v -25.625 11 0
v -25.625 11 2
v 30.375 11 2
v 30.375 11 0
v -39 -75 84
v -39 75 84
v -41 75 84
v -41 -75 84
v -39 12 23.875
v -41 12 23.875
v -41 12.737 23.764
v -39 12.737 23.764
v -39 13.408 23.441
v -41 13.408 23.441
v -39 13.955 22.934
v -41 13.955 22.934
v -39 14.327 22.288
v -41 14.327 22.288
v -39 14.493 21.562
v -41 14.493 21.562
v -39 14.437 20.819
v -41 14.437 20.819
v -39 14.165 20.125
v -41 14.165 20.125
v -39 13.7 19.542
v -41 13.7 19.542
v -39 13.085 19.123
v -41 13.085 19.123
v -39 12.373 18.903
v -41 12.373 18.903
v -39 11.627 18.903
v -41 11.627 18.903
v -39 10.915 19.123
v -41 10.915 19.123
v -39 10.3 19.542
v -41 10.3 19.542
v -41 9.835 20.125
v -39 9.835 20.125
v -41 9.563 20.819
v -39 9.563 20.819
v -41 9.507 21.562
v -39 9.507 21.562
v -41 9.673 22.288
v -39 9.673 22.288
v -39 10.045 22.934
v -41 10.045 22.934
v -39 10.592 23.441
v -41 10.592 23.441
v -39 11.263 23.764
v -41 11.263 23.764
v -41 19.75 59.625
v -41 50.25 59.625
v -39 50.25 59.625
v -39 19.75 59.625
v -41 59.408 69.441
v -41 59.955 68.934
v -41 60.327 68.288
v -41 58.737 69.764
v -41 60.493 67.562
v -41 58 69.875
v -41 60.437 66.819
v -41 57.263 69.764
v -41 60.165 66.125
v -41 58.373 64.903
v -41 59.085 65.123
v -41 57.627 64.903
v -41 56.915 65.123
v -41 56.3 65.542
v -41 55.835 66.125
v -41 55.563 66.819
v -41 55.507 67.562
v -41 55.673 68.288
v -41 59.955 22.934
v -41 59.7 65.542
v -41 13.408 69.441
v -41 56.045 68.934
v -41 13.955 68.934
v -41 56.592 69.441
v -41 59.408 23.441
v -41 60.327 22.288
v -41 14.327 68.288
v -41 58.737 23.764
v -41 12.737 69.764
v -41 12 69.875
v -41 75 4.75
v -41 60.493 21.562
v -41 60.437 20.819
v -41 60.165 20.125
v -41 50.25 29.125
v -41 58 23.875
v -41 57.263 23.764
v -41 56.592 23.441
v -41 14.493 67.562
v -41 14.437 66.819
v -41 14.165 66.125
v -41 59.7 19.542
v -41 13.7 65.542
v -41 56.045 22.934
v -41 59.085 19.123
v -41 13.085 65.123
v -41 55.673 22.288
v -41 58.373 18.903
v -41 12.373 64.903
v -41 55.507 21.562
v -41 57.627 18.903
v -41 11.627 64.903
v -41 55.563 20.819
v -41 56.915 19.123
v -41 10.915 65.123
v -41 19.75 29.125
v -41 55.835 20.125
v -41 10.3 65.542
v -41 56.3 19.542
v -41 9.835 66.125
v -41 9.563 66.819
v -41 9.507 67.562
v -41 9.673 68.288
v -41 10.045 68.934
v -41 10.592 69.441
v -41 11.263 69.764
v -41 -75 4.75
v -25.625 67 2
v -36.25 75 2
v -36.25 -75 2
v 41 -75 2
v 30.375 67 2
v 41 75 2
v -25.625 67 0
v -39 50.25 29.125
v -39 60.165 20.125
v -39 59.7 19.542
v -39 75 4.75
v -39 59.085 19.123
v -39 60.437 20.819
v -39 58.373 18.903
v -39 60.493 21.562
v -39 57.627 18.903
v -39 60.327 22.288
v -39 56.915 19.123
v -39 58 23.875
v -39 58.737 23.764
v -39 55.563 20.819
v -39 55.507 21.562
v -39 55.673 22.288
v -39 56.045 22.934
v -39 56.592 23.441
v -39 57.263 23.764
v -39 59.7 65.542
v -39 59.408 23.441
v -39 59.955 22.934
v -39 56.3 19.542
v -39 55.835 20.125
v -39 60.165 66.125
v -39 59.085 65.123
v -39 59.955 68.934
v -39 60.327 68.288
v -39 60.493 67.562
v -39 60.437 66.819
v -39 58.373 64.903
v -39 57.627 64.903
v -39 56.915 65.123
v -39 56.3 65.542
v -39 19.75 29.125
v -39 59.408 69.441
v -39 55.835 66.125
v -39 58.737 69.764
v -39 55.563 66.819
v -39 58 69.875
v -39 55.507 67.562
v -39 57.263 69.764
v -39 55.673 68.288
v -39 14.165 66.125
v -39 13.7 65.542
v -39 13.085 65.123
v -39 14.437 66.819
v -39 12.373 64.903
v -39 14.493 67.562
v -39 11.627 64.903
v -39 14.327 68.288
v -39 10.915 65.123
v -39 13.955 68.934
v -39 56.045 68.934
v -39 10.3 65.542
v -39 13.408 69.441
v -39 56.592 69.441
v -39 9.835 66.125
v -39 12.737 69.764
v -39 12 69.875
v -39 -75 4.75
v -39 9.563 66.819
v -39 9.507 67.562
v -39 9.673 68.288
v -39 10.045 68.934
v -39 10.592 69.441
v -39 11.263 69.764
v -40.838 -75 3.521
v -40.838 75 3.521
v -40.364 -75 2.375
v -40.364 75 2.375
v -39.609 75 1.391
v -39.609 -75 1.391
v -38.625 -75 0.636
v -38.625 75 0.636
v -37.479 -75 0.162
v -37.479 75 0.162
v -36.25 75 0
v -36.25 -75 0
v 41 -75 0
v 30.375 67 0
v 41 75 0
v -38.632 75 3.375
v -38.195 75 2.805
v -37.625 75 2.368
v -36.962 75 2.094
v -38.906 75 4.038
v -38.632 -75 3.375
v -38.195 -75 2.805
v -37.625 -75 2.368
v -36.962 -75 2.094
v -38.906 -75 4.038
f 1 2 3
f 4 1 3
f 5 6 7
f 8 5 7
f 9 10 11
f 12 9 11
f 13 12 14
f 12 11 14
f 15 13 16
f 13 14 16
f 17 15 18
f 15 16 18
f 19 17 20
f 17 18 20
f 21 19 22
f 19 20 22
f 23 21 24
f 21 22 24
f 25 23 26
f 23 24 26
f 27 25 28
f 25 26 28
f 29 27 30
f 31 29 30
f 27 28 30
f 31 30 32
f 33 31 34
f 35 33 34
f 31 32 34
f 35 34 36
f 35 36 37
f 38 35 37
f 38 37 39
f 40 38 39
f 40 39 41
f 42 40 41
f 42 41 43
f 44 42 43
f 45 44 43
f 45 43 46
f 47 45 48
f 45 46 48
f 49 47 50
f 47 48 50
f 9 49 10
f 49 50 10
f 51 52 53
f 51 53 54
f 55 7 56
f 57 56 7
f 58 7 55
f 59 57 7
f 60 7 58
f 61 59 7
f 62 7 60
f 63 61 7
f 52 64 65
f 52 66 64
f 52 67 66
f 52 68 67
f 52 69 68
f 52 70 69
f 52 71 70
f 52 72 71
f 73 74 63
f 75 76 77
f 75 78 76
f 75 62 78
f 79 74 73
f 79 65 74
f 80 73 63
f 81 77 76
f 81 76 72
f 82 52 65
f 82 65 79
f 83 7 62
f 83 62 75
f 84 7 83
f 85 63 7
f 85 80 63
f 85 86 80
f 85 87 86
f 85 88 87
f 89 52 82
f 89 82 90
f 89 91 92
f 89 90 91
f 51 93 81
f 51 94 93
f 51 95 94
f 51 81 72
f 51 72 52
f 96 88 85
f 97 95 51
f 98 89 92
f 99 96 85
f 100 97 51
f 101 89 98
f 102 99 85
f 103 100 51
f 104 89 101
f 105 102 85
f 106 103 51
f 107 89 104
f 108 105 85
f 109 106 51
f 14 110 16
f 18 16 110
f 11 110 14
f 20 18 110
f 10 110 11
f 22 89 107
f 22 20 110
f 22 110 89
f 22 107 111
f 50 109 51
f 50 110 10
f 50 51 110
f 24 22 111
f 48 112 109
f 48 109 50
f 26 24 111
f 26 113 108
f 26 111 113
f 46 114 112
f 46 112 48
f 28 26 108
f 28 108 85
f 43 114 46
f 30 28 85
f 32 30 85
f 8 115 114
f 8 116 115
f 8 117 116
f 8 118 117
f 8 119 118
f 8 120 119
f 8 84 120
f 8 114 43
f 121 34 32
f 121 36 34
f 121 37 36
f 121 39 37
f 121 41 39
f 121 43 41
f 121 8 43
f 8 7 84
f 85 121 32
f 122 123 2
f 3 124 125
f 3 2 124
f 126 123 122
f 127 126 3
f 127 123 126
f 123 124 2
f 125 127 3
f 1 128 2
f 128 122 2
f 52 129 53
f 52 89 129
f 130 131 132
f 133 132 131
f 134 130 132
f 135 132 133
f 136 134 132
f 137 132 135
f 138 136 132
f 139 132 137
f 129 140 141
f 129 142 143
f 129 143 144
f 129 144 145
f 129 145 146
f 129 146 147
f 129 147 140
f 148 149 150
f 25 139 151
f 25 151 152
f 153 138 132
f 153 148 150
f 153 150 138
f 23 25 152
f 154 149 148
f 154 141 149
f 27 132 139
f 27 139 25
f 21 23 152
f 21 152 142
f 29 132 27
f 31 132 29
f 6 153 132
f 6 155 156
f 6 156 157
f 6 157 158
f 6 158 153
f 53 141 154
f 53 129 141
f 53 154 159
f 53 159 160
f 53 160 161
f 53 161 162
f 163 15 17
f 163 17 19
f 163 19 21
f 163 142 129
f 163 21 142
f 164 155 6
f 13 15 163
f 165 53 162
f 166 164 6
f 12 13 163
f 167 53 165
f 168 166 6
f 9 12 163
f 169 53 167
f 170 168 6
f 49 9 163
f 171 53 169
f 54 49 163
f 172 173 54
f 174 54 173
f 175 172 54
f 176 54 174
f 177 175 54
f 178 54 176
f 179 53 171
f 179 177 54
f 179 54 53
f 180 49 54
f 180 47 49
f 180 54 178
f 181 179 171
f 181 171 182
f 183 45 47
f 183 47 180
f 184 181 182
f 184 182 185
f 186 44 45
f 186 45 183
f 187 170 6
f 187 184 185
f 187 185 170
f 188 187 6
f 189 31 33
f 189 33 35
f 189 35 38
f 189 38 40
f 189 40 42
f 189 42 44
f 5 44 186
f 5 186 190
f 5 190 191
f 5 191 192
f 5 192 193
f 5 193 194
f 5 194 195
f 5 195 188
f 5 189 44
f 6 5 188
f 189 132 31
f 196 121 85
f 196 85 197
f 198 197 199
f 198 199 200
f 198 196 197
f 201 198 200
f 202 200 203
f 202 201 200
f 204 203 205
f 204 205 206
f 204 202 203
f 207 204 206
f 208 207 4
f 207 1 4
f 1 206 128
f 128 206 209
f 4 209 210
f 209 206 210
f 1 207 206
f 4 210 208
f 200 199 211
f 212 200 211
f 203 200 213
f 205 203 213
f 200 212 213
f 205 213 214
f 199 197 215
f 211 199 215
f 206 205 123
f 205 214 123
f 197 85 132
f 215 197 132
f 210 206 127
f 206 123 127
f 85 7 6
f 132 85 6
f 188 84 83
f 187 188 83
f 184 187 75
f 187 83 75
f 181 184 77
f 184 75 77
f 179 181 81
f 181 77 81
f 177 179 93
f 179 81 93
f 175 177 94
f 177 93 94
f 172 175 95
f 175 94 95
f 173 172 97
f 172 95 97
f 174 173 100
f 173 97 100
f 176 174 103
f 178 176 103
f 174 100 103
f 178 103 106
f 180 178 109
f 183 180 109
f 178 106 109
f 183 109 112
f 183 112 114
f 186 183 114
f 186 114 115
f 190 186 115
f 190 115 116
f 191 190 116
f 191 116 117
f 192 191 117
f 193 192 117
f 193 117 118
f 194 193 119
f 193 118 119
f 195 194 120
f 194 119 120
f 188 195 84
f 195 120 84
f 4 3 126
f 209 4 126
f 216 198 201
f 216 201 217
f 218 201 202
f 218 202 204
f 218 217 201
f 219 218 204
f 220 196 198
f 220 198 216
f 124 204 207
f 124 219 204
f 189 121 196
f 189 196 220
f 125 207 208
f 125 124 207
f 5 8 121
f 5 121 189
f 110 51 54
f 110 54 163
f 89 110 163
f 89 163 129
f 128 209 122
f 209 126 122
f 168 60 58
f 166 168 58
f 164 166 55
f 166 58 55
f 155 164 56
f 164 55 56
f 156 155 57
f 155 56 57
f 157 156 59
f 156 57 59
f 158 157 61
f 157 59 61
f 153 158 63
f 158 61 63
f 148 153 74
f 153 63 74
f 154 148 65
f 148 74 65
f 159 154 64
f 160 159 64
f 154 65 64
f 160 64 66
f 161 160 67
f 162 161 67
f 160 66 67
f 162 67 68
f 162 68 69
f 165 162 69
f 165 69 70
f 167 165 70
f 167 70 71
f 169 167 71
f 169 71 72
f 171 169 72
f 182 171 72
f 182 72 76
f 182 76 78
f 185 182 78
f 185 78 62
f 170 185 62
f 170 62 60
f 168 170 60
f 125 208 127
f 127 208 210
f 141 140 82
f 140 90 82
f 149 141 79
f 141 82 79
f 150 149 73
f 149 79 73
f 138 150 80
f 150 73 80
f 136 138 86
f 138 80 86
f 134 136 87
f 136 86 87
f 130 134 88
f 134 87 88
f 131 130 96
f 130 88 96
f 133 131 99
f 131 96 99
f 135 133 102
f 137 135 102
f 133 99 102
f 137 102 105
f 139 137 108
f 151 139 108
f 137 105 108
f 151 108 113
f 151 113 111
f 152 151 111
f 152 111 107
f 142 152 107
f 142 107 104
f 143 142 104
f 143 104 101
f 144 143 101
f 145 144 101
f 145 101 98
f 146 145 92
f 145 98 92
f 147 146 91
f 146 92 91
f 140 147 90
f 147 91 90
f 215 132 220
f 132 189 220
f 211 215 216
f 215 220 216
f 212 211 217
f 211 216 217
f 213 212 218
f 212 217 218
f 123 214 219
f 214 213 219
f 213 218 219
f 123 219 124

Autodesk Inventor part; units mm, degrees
ref_plane "YZ Plane" through (0, 0, 0) normal (1, 0, 0) x (0, 1, 0)
ref_plane "XZ Plane" through (0, 0, 0) normal (0, 1, 0) x (-1, 0, 0)
ref_plane "XY Plane" through (0, 0, 0) normal (0, 0, 1) x (1, 0, 0)
sketch "Sketch1" plane through (0, 0, 0) normal (0, 0, 1) x (1, 0, 0)
  line L0 (-41, -75) -> (41, -75)
  line L1 (41, -75) -> (41, 75)
  line L2 (41, 75) -> (-41, 75)
  line L3 (-41, 75) -> (-41, -75)
  line L4 (-41, -75) -> (41, 75) construction
  line L5 (41, -75) -> (-41, 75) construction
  point P0 (0, 0)
  dimension "d154" = 82
  dimension "d155" = 150
extrude "Plate5" add sketch "Sketch1" along normal blind 2
sketch "Sketch7" plane through (-39, -75, 0) normal (-1, 0, 0) x (0, -1, 0)
  line L0 (-150, 0) -> (0, 0)
  line L1 (0, 0) -> (0, 84)
  line L2 (0, 84) -> (-150, 84)
  line L3 (-150, 84) -> (-150, 0)
edge flange "Flange3" height 84 angle 90 thickness 2 bend radius 2.75 thickness toward (-1, 0, 0) relief round relief width 2 relief depth 1 edges at (-41, 0, 2) wall of the first edge with corners at (-39, 75, 0) (-39, -75, 0) (-39, -75, 84) (-39, 75, 84)
bend "Bend3"
corner "Corner3"
sketch "Sketch8" plane through (0, 0, 2) normal (0, 0, 1) x (1, 0, 0)
  line L0 (41, 75) -> (41, -75) projected
  line L1 (-36.25, 75) -> (41, 75) projected
  line L2 (30.375, 67) -> (-25.625, 67)
  line L3 (-25.625, 67) -> (-25.625, 11)
  line L4 (-25.625, 11) -> (30.375, 11)
  line L5 (30.375, 11) -> (30.375, 67)
  line L6 (30.375, 67) -> (-25.625, 11) construction
  line L7 (-25.625, 67) -> (30.375, 11) construction
  point P0 (0, 0)
  point P1 (2.375, 39)
  point P2 (2.375, 75)
  dimension "d167" = 56
  dimension "d168" = 56
  dimension "d169" = 8
extrude "Cut1" cut sketch "Sketch8" against normal blind 2
sketch "Sketch9" plane through (-41, -75, 84) normal (-1, 0, 0) x (0, 0, 1)
  line L0 (-24.375, 94.75) -> (-54.875, 94.75)
  line L1 (-54.875, 94.75) -> (-54.875, 125.25)
  line L2 (-54.875, 125.25) -> (-24.375, 125.25)
  line L3 (-24.375, 125.25) -> (-24.375, 94.75)
  line L4 (-24.375, 94.75) -> (-54.875, 125.25) construction
  line L5 (-54.875, 94.75) -> (-24.375, 125.25) construction
  circle A0 centre (-16.625, 87) radius 2.5
  circle A1 centre (-62.625, 87) radius 2.5
  circle A2 centre (-62.625, 133) radius 2.5
  circle A3 centre (-16.625, 133) radius 2.5
  circle A4 centre (-39.625, 110) radius 32.5269 construction
  line L6 (-54.875, 94.75) -> (-62.625, 87) construction
  line L7 (-14.125, 84.5) -> (-65.125, 84.5) construction
  line L8 (-65.125, 84.5) -> (-65.125, 135.5) construction
  line L9 (-65.125, 135.5) -> (-14.125, 135.5) construction
  line L10 (-14.125, 135.5) -> (-14.125, 84.5) construction
  line L11 (-14.125, 84.5) -> (-65.125, 135.5) construction
  line L12 (-65.125, 84.5) -> (-14.125, 135.5) construction
  line L13 (-79.25, 150) -> (0, 150) projected
  line L14 (-39.625, 150) -> (-39.625, 110) construction
  circle A5 centre (-62.625, 133) radius 10.9602 construction
  line L15 (-16.625, 87) -> (-62.625, 87) construction
  line L16 (-62.625, 87) -> (-62.625, 133) construction
  line L17 (-62.625, 133) -> (-16.625, 133) construction
  line L18 (-16.625, 133) -> (-16.625, 87) construction
  line L19 (-16.625, 87) -> (-62.625, 133) construction
  line L20 (-62.625, 87) -> (-16.625, 133) construction
  point P0 (-84, 75)
  point P1 (-104.8197, 150.8767)
  point P2 (-104.8197, 150.8767)
  dimension "d181" = 21.9203
  dimension "d174" = 30.5
  dimension "d175" = 30.5
  dimension "d176" = 5
  dimension "d179" = 40
  dimension "d180" = 51
  dimension "d184" = 46
extrude "Cut2" cut sketch "Sketch9" against normal blind 2
properties part number "SLM 1652 FDS Central tube wall" material "Stainless Steel"
